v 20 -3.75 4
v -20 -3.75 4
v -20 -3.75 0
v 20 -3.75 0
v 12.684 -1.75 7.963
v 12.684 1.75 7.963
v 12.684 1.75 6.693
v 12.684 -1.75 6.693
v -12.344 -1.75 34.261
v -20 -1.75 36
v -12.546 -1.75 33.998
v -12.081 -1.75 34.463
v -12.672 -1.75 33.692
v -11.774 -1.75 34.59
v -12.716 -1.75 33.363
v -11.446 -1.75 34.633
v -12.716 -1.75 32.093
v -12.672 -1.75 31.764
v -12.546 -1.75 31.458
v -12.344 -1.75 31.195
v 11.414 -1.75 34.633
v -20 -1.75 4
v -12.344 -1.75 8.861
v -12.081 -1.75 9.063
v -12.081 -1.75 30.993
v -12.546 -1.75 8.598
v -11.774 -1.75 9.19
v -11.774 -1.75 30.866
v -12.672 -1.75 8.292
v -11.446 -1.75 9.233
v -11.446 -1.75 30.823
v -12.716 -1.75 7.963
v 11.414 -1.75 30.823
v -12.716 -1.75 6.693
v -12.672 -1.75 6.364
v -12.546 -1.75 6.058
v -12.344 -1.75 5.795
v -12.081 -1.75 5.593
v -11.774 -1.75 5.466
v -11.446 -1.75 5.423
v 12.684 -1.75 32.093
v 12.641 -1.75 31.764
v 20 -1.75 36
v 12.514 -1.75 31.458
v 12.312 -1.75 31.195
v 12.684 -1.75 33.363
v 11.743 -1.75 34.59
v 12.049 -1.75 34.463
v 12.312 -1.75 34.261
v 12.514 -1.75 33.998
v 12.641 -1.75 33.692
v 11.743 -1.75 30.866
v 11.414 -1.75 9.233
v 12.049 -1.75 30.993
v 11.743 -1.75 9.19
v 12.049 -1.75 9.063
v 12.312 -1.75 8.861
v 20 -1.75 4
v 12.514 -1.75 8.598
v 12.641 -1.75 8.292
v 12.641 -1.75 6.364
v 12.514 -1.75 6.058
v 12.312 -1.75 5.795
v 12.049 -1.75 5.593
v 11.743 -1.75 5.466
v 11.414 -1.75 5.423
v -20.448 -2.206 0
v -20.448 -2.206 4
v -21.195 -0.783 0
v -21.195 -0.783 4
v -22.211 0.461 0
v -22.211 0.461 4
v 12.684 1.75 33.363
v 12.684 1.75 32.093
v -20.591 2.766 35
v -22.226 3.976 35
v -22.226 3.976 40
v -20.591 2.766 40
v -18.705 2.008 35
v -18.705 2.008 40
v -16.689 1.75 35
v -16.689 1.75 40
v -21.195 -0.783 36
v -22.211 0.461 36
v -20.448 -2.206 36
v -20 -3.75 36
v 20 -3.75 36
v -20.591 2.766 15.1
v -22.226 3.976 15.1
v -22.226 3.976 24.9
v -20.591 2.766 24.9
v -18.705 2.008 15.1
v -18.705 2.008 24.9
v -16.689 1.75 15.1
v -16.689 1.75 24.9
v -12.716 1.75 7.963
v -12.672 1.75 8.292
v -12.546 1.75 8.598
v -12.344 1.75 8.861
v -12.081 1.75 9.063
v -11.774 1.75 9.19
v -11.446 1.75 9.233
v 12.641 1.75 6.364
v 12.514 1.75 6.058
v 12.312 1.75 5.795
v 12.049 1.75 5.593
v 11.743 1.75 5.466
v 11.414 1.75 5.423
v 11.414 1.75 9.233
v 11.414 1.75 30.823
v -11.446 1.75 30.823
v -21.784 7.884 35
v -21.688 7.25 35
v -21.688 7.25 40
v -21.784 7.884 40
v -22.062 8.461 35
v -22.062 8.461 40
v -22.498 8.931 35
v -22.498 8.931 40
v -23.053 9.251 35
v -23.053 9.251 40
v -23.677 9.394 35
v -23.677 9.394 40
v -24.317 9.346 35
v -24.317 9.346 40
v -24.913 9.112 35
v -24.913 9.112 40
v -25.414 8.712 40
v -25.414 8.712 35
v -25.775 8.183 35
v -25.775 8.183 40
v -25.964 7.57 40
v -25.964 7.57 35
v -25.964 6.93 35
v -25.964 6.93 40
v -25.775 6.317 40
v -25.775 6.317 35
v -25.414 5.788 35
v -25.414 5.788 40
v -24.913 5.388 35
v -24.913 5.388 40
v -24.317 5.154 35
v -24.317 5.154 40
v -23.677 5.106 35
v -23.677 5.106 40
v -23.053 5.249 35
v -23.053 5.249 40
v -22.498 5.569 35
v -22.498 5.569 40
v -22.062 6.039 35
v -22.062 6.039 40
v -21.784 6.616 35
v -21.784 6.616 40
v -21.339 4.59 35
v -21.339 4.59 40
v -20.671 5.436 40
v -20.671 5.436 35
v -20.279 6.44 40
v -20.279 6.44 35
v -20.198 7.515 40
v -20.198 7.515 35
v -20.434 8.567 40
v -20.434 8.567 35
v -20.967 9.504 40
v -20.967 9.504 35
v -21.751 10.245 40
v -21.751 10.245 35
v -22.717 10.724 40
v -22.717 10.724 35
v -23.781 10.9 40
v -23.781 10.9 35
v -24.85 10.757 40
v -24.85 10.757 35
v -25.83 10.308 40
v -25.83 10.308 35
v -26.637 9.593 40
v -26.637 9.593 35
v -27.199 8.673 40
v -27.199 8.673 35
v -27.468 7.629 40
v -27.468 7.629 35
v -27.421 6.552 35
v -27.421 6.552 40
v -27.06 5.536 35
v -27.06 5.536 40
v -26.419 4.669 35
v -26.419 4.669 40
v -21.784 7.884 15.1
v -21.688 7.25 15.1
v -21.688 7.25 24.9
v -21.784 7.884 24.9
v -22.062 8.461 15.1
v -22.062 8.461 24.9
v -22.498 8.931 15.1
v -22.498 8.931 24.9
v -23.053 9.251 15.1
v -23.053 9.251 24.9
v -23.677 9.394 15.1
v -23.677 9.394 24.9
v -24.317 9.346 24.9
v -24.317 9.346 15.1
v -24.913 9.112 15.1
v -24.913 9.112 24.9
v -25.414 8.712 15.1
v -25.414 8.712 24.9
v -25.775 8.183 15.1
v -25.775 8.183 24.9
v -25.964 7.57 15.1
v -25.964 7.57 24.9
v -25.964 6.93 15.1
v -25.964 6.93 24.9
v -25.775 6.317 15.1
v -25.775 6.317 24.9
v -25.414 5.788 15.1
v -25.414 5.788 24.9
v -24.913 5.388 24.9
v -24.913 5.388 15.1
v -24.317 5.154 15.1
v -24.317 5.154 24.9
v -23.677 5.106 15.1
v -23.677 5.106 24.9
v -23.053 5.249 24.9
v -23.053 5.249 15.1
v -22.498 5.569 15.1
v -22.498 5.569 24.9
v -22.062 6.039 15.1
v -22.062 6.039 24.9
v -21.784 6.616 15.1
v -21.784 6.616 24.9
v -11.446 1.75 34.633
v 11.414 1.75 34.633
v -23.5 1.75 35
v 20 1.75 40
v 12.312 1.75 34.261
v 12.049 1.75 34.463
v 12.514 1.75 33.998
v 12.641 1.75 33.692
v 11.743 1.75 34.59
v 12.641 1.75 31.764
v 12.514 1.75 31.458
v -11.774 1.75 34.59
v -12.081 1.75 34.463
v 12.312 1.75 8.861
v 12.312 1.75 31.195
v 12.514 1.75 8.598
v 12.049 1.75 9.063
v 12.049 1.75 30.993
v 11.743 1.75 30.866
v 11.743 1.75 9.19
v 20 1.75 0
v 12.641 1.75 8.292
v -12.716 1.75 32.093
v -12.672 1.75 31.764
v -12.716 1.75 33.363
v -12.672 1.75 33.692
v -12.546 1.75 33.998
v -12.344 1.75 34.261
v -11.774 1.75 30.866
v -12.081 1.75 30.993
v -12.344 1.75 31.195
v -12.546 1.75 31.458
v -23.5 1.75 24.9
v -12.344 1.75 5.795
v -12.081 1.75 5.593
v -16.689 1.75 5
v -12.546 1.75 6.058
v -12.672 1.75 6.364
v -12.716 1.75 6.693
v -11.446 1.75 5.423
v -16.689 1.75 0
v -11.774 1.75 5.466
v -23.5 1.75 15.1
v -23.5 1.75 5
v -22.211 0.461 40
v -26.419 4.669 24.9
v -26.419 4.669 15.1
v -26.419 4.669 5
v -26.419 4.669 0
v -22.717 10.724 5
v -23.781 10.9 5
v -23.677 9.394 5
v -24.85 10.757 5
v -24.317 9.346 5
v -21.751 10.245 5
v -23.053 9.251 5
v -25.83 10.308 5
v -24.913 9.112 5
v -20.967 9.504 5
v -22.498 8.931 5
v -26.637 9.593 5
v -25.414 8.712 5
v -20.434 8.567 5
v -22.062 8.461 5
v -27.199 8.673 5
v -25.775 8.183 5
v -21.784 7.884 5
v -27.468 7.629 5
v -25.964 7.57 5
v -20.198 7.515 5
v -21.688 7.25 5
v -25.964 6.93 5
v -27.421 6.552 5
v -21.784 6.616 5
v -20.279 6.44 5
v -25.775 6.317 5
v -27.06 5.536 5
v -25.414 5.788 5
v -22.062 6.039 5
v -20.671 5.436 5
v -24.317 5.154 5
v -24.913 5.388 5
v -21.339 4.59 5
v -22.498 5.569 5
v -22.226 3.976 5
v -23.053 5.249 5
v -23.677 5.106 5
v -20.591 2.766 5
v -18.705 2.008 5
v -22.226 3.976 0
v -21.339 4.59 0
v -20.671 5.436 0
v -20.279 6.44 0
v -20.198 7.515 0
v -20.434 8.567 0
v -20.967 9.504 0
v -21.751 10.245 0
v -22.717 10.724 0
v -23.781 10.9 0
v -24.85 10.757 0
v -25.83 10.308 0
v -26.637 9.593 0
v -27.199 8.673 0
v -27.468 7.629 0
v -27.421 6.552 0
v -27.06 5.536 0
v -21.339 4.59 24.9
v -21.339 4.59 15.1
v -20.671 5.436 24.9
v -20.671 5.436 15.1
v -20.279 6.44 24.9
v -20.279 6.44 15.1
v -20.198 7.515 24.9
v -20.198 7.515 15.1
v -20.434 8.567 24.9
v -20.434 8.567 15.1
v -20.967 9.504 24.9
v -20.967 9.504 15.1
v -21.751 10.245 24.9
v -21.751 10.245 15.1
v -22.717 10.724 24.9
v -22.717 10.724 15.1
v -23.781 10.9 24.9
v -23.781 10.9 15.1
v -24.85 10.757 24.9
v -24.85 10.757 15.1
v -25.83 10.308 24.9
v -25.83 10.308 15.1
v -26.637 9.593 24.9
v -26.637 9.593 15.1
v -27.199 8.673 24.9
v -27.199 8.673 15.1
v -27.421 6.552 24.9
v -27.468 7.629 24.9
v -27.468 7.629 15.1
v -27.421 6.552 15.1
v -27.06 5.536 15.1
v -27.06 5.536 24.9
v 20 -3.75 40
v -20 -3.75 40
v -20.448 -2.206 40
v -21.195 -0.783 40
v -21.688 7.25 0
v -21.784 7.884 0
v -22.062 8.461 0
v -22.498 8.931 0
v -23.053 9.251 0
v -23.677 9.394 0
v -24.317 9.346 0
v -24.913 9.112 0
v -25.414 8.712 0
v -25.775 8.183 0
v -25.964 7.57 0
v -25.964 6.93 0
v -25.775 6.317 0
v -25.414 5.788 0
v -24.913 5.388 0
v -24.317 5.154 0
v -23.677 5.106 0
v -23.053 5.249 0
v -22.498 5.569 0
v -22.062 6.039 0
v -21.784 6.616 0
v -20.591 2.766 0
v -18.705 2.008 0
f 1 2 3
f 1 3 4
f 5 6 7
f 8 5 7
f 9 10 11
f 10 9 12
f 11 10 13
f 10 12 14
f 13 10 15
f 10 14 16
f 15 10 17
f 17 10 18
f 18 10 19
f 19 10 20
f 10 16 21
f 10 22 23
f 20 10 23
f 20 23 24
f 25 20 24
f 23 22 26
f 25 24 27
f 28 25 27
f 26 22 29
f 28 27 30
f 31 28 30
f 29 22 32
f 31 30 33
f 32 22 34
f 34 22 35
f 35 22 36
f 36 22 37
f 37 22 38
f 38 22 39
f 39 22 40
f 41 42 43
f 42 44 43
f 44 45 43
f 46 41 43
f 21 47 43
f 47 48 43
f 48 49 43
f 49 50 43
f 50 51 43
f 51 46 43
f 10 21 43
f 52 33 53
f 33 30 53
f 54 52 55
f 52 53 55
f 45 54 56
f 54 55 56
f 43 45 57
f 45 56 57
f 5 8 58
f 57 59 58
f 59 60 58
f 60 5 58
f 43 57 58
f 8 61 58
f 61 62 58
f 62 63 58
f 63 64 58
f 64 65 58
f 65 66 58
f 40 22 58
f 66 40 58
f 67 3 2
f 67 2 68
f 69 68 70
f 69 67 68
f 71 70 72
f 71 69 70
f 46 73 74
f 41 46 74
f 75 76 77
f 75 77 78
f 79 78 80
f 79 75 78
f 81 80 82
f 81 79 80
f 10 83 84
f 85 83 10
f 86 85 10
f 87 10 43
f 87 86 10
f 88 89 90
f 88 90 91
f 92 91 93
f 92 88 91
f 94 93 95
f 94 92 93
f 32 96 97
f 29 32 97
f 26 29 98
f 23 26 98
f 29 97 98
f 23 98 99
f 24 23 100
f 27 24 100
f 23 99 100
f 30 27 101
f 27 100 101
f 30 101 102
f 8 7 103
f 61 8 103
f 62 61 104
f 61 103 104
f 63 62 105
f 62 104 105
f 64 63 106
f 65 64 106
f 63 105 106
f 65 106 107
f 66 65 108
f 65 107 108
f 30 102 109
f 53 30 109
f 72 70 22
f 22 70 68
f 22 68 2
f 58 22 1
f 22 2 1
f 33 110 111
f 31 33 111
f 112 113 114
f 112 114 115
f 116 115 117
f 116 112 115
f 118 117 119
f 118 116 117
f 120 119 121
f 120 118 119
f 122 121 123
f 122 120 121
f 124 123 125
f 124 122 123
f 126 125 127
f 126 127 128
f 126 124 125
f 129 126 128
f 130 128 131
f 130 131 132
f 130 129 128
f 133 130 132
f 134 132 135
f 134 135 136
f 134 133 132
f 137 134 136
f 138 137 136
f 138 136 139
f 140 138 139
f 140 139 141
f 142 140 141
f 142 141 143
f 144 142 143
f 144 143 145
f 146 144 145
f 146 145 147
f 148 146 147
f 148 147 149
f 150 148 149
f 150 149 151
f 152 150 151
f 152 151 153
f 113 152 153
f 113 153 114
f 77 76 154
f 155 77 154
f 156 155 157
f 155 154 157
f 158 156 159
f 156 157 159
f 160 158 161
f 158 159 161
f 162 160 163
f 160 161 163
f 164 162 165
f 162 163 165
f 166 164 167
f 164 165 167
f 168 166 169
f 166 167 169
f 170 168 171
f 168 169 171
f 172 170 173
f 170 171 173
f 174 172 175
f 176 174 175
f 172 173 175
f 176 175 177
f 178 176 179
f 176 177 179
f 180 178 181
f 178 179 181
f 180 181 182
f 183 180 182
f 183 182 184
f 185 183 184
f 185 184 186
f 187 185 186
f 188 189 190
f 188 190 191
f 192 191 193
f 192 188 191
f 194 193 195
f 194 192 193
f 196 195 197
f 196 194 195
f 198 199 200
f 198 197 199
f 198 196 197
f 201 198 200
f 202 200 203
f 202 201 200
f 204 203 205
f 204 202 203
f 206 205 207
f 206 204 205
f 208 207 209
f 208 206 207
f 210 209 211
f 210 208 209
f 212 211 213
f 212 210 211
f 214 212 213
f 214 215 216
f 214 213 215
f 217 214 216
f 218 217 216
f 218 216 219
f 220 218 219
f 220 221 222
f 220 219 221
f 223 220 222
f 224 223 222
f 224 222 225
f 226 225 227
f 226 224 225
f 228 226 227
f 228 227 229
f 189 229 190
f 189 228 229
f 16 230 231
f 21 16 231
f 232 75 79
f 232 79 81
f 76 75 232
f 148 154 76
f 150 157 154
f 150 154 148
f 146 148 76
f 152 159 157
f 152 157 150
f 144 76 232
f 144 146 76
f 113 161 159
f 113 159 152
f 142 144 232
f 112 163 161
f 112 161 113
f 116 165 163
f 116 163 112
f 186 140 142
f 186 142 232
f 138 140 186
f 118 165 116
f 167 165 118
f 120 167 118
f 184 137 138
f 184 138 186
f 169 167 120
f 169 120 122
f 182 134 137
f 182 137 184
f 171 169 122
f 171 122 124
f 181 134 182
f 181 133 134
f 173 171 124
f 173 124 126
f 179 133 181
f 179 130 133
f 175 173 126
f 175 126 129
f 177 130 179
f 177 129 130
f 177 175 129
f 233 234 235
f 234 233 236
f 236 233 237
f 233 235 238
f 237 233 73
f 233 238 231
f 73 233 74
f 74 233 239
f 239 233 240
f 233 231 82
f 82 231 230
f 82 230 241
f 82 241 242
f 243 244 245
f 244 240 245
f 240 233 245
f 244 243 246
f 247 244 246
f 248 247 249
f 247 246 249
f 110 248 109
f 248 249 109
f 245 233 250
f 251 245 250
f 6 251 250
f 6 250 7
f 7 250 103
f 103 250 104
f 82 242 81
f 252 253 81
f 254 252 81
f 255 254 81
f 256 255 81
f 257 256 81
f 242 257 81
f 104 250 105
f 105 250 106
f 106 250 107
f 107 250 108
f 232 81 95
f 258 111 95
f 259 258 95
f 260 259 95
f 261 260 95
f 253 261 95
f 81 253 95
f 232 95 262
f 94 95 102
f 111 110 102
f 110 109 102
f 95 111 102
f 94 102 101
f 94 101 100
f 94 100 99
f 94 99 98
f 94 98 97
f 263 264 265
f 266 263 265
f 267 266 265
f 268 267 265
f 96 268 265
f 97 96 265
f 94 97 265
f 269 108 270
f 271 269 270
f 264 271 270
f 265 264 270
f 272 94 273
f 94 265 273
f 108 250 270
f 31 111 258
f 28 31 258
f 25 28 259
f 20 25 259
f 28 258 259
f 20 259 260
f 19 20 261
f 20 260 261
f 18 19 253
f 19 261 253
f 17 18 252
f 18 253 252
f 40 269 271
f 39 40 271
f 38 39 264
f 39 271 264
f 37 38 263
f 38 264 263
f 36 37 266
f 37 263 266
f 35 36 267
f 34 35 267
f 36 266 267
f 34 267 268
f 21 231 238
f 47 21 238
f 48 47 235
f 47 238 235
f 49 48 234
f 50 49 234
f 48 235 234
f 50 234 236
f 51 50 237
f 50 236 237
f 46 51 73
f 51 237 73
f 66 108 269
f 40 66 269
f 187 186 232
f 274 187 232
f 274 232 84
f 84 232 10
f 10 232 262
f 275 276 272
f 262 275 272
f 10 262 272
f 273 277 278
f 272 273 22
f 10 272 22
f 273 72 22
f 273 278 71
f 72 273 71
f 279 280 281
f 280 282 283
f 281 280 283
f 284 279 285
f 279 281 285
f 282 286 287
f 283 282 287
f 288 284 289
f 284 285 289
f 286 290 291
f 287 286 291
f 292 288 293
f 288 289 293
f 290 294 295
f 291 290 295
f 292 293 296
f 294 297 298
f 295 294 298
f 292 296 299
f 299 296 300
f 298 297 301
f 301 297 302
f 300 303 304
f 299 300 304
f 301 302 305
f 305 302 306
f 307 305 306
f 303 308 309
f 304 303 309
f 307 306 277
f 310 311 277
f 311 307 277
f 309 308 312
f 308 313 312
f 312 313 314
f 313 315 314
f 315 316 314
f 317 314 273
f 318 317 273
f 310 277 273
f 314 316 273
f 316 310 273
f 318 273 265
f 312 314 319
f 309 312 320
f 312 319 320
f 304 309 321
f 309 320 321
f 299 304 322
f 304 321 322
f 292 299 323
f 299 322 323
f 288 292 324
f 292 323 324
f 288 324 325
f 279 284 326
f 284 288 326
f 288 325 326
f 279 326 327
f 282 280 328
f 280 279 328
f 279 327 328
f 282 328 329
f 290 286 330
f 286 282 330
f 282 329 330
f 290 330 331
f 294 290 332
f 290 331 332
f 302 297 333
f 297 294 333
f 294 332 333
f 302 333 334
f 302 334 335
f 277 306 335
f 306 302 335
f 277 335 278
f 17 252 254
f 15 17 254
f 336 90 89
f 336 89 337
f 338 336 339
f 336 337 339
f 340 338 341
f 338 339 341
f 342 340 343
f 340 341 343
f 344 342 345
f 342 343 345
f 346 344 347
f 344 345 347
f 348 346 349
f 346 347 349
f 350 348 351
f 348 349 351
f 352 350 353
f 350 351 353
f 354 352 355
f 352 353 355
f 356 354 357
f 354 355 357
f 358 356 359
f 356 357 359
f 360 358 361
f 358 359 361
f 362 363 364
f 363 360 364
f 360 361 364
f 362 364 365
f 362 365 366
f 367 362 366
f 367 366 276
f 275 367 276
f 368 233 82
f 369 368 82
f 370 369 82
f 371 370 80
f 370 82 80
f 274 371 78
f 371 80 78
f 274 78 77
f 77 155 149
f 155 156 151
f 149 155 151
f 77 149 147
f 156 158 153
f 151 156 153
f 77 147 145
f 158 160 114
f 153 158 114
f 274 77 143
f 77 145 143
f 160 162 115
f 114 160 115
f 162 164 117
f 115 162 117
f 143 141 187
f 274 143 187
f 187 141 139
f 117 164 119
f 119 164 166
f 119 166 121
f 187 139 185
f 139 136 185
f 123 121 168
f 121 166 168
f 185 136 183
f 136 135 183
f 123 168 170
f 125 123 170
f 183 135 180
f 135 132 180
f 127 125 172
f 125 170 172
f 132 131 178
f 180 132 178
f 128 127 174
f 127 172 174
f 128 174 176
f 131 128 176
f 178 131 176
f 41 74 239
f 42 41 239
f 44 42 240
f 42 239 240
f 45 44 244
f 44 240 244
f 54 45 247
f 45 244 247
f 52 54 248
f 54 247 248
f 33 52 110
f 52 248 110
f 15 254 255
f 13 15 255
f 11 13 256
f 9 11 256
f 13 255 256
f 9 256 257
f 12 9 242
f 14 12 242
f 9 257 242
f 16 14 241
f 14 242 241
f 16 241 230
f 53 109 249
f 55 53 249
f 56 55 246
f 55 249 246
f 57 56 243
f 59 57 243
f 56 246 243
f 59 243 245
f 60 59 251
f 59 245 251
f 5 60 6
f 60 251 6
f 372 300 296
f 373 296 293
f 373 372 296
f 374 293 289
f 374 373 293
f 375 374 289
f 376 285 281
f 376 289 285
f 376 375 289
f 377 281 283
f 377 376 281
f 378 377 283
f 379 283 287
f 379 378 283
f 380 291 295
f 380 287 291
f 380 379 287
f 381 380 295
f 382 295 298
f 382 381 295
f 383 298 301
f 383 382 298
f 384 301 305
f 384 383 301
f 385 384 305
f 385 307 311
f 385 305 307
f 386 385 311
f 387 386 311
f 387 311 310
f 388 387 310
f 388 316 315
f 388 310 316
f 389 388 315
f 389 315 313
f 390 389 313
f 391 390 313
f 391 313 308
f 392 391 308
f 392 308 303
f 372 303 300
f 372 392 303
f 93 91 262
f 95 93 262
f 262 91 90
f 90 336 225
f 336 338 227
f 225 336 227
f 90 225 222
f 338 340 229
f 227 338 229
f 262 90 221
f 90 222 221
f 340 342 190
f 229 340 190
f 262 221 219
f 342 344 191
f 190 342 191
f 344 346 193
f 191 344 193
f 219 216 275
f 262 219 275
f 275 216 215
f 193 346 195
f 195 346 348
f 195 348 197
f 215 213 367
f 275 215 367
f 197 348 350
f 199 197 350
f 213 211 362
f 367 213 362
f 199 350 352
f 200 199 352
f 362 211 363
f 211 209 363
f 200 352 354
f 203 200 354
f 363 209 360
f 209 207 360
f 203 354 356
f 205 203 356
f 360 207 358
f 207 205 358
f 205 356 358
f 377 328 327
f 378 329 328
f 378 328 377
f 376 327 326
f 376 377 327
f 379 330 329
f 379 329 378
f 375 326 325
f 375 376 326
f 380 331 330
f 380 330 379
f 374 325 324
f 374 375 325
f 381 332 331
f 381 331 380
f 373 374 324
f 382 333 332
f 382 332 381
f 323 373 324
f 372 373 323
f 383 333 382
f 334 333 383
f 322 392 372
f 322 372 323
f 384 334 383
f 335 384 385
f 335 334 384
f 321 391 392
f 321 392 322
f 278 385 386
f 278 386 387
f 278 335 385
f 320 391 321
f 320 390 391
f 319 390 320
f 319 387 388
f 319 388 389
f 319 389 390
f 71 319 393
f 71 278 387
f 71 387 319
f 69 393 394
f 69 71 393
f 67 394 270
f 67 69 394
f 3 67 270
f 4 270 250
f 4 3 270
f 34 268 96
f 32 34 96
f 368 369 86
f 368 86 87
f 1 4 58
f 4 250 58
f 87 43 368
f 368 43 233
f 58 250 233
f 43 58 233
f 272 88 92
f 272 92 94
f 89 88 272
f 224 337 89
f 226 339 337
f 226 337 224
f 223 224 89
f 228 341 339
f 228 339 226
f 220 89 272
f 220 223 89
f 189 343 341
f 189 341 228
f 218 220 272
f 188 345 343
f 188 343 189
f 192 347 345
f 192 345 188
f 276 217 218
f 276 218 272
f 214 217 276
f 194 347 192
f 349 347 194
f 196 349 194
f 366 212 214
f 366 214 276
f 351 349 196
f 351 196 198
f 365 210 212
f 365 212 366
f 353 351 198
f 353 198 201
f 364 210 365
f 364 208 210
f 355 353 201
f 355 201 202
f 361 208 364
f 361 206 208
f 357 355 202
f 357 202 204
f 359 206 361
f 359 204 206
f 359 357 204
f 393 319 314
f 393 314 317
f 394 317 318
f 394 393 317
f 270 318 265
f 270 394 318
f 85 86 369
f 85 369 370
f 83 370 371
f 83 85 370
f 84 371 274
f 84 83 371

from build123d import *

# Parameters (mm, degrees)
SKETCH_1_R               = 2.15
EXTRUDE_1_DEPTH          = 40
CUT_EXTRUDE_2_DEPTH      = 58.739891142
CUT_EXTRUDE_2_DEPTH_BACK = 10
SKETCH_2_W               = 10.1
SKETCH_2_H               = 10
SKETCH_4_W               = 40
SKETCH_4_H               = 4
EXTRUDE_2_DEPTH          = 2
CUT_EXTRUDE_3_DEPTH      = 3.5
FILLET_1_R               = 8


with BuildPart() as part:
    # 草图1 → 凸台-拉伸1 (new body)
    with BuildSketch(Plane.XY):
        with BuildLine():
            Line((-20, 1.75), (-22.225540425, 3.975540425))
            ThreePointArc((-22.225540425, 3.975540425), (-23.242576583, 10.851086981), (-26.419060249, 4.669060249))
            Line((-26.419060249, 4.669060249), (-20, -1.75))
            Line((-20, -1.75), (20, -1.75))
            Line((20, -1.75), (20, 1.75))
            Line((20, 1.75), (-20, 1.75))
        make_face()
        with Locations((-23.838120497, 7.25)):
            Circle(SKETCH_1_R, mode=Mode.SUBTRACT)
    extrude(amount=EXTRUDE_1_DEPTH)

    # 草图2 → 切除-拉伸2 (cut, two sides: drawn at the far end of the back side and taken through both)
    with BuildSketch(Plane(origin=(-20.188120497, 0, 0), x_dir=(0, 0, -1), z_dir=(1, 0, 0)).offset(-CUT_EXTRUDE_2_DEPTH_BACK)):
        with Locations((-29.95, 6.75)):
            Rectangle(SKETCH_2_W, SKETCH_2_H)
        with Locations((-10.05, 6.75)):
            Rectangle(SKETCH_2_W, SKETCH_2_H)
    extrude(amount=CUT_EXTRUDE_2_DEPTH + CUT_EXTRUDE_2_DEPTH_BACK, mode=Mode.SUBTRACT)

    # 草图4 → 凸台-拉伸2 (add)
    with BuildSketch(Plane.XZ.offset(1.75)):
        with Locations((0, 2)):
            Rectangle(SKETCH_4_W, SKETCH_4_H)
        with Locations((0, 38)):
            Rectangle(SKETCH_4_W, SKETCH_4_H)
    extrude(amount=EXTRUDE_2_DEPTH)

    # 草图5 → 切除-拉伸3 (cut)
    with BuildSketch(Plane(origin=(0, 1.75, 0), x_dir=(1, 0, 0), z_dir=(0, 1, 0))):
        with BuildLine():
            Line((11.414328277, -30.822898901), (-11.445671723, -30.822898901))
            ThreePointArc((-11.445671723, -30.822898901), (-12.343697335, -31.194873288), (-12.715671723, -32.092898901))
            Line((-12.715671723, -32.092898901), (-12.715671723, -33.362898901))
            ThreePointArc((-12.715671723, -33.362898901), (-12.343697335, -34.260924513), (-11.445671723, -34.632898901))
            Line((-11.445671723, -34.632898901), (11.414328277, -34.632898901))
            ThreePointArc((11.414328277, -34.632898901), (12.31235389, -34.260924513), (12.684328277, -33.362898901))
            Line((12.684328277, -33.362898901), (12.684328277, -32.092898901))
            ThreePointArc((12.684328277, -32.092898901), (12.31235389, -31.194873288), (11.414328277, -30.822898901))
        make_face()
        with BuildLine():
            Line((12.684328277, -7.962898901), (12.684328277, -6.692898901))
            ThreePointArc((12.684328277, -6.692898901), (12.31235389, -5.794873288), (11.414328277, -5.422898901))
            Line((11.414328277, -5.422898901), (-11.445671723, -5.422898901))
            ThreePointArc((-11.445671723, -5.422898901), (-12.343697335, -5.794873288), (-12.715671723, -6.692898901))
            Line((-12.715671723, -6.692898901), (-12.715671723, -7.962898901))
            ThreePointArc((-12.715671723, -7.962898901), (-12.343697335, -8.860924513), (-11.445671723, -9.232898901))
            Line((-11.445671723, -9.232898901), (11.414328277, -9.232898901))
            ThreePointArc((11.414328277, -9.232898901), (12.31235389, -8.860924513), (12.684328277, -7.962898901))
        make_face()
    extrude(amount=-CUT_EXTRUDE_3_DEPTH, mode=Mode.SUBTRACT)

    # 圆角1
    # the kernel refuses this fillet: 8 mm, written as the material it adds along each edge
    with BuildSketch(Plane(origin=(-20, -1.75, 0), x_dir=(-0.707106781186549, 0.7071067811865461, 0), z_dir=(0, 0, 1)), Plane(origin=(-20, -1.75, 36), x_dir=(-0.707106781186549, 0.7071067811865461, 0), z_dir=(0, 0, 1))) as fillet_1_piece_1:
        with BuildLine():
            CenterArc((3.127528064, 8), FILLET_1_R, 235.408772886, 34.591227114)
            Line((-1.414213562, 1.414213562), (0, 0))
            Line((0, 0), (3.127528064, 0))
        make_face()
    extrude(amount=4)
    with BuildSketch(Plane(origin=(-20, 1.75, 0), x_dir=(-0.7071067811865483, 0.7071067811865467, 0), z_dir=(0, 0, 1))) as fillet_1_piece_2:
        with BuildLine():
            CenterArc((3.31547448, -7.998234019), FILLET_1_R, 91.203908923, 43.796091077)
            Line((-2.34137977, -2.34137977), (0, 0))
            Line((0, 0), (3.147389452, 0))
        make_face()
    extrude(amount=5)
    with BuildSketch(Plane(origin=(-20, 1.75, 15.1), x_dir=(1, 0, 0), z_dir=(0, 0, 1))) as fillet_1_piece_3:
        with BuildLine():
            CenterArc((3.311211025, 8), FILLET_1_R, 226.203908923, 43.796091077)
            Line((-2.225540425, 2.225540425), (0, 0))
            Line((0, 0), (3.311211025, 0))
        make_face()
    extrude(amount=9.8)
    with BuildSketch(Plane(origin=(-20, 1.75, 35), x_dir=(1, 0, 0), z_dir=(0, 0, 1))) as fillet_1_piece_4:
        with BuildLine():
            CenterArc((3.311211025, 8), FILLET_1_R, 226.203908923, 43.796091077)
            Line((-2.225540425, 2.225540425), (0, 0))
            Line((0, 0), (3.311211025, 0))
        make_face()
    extrude(amount=5)


solid = part.part
